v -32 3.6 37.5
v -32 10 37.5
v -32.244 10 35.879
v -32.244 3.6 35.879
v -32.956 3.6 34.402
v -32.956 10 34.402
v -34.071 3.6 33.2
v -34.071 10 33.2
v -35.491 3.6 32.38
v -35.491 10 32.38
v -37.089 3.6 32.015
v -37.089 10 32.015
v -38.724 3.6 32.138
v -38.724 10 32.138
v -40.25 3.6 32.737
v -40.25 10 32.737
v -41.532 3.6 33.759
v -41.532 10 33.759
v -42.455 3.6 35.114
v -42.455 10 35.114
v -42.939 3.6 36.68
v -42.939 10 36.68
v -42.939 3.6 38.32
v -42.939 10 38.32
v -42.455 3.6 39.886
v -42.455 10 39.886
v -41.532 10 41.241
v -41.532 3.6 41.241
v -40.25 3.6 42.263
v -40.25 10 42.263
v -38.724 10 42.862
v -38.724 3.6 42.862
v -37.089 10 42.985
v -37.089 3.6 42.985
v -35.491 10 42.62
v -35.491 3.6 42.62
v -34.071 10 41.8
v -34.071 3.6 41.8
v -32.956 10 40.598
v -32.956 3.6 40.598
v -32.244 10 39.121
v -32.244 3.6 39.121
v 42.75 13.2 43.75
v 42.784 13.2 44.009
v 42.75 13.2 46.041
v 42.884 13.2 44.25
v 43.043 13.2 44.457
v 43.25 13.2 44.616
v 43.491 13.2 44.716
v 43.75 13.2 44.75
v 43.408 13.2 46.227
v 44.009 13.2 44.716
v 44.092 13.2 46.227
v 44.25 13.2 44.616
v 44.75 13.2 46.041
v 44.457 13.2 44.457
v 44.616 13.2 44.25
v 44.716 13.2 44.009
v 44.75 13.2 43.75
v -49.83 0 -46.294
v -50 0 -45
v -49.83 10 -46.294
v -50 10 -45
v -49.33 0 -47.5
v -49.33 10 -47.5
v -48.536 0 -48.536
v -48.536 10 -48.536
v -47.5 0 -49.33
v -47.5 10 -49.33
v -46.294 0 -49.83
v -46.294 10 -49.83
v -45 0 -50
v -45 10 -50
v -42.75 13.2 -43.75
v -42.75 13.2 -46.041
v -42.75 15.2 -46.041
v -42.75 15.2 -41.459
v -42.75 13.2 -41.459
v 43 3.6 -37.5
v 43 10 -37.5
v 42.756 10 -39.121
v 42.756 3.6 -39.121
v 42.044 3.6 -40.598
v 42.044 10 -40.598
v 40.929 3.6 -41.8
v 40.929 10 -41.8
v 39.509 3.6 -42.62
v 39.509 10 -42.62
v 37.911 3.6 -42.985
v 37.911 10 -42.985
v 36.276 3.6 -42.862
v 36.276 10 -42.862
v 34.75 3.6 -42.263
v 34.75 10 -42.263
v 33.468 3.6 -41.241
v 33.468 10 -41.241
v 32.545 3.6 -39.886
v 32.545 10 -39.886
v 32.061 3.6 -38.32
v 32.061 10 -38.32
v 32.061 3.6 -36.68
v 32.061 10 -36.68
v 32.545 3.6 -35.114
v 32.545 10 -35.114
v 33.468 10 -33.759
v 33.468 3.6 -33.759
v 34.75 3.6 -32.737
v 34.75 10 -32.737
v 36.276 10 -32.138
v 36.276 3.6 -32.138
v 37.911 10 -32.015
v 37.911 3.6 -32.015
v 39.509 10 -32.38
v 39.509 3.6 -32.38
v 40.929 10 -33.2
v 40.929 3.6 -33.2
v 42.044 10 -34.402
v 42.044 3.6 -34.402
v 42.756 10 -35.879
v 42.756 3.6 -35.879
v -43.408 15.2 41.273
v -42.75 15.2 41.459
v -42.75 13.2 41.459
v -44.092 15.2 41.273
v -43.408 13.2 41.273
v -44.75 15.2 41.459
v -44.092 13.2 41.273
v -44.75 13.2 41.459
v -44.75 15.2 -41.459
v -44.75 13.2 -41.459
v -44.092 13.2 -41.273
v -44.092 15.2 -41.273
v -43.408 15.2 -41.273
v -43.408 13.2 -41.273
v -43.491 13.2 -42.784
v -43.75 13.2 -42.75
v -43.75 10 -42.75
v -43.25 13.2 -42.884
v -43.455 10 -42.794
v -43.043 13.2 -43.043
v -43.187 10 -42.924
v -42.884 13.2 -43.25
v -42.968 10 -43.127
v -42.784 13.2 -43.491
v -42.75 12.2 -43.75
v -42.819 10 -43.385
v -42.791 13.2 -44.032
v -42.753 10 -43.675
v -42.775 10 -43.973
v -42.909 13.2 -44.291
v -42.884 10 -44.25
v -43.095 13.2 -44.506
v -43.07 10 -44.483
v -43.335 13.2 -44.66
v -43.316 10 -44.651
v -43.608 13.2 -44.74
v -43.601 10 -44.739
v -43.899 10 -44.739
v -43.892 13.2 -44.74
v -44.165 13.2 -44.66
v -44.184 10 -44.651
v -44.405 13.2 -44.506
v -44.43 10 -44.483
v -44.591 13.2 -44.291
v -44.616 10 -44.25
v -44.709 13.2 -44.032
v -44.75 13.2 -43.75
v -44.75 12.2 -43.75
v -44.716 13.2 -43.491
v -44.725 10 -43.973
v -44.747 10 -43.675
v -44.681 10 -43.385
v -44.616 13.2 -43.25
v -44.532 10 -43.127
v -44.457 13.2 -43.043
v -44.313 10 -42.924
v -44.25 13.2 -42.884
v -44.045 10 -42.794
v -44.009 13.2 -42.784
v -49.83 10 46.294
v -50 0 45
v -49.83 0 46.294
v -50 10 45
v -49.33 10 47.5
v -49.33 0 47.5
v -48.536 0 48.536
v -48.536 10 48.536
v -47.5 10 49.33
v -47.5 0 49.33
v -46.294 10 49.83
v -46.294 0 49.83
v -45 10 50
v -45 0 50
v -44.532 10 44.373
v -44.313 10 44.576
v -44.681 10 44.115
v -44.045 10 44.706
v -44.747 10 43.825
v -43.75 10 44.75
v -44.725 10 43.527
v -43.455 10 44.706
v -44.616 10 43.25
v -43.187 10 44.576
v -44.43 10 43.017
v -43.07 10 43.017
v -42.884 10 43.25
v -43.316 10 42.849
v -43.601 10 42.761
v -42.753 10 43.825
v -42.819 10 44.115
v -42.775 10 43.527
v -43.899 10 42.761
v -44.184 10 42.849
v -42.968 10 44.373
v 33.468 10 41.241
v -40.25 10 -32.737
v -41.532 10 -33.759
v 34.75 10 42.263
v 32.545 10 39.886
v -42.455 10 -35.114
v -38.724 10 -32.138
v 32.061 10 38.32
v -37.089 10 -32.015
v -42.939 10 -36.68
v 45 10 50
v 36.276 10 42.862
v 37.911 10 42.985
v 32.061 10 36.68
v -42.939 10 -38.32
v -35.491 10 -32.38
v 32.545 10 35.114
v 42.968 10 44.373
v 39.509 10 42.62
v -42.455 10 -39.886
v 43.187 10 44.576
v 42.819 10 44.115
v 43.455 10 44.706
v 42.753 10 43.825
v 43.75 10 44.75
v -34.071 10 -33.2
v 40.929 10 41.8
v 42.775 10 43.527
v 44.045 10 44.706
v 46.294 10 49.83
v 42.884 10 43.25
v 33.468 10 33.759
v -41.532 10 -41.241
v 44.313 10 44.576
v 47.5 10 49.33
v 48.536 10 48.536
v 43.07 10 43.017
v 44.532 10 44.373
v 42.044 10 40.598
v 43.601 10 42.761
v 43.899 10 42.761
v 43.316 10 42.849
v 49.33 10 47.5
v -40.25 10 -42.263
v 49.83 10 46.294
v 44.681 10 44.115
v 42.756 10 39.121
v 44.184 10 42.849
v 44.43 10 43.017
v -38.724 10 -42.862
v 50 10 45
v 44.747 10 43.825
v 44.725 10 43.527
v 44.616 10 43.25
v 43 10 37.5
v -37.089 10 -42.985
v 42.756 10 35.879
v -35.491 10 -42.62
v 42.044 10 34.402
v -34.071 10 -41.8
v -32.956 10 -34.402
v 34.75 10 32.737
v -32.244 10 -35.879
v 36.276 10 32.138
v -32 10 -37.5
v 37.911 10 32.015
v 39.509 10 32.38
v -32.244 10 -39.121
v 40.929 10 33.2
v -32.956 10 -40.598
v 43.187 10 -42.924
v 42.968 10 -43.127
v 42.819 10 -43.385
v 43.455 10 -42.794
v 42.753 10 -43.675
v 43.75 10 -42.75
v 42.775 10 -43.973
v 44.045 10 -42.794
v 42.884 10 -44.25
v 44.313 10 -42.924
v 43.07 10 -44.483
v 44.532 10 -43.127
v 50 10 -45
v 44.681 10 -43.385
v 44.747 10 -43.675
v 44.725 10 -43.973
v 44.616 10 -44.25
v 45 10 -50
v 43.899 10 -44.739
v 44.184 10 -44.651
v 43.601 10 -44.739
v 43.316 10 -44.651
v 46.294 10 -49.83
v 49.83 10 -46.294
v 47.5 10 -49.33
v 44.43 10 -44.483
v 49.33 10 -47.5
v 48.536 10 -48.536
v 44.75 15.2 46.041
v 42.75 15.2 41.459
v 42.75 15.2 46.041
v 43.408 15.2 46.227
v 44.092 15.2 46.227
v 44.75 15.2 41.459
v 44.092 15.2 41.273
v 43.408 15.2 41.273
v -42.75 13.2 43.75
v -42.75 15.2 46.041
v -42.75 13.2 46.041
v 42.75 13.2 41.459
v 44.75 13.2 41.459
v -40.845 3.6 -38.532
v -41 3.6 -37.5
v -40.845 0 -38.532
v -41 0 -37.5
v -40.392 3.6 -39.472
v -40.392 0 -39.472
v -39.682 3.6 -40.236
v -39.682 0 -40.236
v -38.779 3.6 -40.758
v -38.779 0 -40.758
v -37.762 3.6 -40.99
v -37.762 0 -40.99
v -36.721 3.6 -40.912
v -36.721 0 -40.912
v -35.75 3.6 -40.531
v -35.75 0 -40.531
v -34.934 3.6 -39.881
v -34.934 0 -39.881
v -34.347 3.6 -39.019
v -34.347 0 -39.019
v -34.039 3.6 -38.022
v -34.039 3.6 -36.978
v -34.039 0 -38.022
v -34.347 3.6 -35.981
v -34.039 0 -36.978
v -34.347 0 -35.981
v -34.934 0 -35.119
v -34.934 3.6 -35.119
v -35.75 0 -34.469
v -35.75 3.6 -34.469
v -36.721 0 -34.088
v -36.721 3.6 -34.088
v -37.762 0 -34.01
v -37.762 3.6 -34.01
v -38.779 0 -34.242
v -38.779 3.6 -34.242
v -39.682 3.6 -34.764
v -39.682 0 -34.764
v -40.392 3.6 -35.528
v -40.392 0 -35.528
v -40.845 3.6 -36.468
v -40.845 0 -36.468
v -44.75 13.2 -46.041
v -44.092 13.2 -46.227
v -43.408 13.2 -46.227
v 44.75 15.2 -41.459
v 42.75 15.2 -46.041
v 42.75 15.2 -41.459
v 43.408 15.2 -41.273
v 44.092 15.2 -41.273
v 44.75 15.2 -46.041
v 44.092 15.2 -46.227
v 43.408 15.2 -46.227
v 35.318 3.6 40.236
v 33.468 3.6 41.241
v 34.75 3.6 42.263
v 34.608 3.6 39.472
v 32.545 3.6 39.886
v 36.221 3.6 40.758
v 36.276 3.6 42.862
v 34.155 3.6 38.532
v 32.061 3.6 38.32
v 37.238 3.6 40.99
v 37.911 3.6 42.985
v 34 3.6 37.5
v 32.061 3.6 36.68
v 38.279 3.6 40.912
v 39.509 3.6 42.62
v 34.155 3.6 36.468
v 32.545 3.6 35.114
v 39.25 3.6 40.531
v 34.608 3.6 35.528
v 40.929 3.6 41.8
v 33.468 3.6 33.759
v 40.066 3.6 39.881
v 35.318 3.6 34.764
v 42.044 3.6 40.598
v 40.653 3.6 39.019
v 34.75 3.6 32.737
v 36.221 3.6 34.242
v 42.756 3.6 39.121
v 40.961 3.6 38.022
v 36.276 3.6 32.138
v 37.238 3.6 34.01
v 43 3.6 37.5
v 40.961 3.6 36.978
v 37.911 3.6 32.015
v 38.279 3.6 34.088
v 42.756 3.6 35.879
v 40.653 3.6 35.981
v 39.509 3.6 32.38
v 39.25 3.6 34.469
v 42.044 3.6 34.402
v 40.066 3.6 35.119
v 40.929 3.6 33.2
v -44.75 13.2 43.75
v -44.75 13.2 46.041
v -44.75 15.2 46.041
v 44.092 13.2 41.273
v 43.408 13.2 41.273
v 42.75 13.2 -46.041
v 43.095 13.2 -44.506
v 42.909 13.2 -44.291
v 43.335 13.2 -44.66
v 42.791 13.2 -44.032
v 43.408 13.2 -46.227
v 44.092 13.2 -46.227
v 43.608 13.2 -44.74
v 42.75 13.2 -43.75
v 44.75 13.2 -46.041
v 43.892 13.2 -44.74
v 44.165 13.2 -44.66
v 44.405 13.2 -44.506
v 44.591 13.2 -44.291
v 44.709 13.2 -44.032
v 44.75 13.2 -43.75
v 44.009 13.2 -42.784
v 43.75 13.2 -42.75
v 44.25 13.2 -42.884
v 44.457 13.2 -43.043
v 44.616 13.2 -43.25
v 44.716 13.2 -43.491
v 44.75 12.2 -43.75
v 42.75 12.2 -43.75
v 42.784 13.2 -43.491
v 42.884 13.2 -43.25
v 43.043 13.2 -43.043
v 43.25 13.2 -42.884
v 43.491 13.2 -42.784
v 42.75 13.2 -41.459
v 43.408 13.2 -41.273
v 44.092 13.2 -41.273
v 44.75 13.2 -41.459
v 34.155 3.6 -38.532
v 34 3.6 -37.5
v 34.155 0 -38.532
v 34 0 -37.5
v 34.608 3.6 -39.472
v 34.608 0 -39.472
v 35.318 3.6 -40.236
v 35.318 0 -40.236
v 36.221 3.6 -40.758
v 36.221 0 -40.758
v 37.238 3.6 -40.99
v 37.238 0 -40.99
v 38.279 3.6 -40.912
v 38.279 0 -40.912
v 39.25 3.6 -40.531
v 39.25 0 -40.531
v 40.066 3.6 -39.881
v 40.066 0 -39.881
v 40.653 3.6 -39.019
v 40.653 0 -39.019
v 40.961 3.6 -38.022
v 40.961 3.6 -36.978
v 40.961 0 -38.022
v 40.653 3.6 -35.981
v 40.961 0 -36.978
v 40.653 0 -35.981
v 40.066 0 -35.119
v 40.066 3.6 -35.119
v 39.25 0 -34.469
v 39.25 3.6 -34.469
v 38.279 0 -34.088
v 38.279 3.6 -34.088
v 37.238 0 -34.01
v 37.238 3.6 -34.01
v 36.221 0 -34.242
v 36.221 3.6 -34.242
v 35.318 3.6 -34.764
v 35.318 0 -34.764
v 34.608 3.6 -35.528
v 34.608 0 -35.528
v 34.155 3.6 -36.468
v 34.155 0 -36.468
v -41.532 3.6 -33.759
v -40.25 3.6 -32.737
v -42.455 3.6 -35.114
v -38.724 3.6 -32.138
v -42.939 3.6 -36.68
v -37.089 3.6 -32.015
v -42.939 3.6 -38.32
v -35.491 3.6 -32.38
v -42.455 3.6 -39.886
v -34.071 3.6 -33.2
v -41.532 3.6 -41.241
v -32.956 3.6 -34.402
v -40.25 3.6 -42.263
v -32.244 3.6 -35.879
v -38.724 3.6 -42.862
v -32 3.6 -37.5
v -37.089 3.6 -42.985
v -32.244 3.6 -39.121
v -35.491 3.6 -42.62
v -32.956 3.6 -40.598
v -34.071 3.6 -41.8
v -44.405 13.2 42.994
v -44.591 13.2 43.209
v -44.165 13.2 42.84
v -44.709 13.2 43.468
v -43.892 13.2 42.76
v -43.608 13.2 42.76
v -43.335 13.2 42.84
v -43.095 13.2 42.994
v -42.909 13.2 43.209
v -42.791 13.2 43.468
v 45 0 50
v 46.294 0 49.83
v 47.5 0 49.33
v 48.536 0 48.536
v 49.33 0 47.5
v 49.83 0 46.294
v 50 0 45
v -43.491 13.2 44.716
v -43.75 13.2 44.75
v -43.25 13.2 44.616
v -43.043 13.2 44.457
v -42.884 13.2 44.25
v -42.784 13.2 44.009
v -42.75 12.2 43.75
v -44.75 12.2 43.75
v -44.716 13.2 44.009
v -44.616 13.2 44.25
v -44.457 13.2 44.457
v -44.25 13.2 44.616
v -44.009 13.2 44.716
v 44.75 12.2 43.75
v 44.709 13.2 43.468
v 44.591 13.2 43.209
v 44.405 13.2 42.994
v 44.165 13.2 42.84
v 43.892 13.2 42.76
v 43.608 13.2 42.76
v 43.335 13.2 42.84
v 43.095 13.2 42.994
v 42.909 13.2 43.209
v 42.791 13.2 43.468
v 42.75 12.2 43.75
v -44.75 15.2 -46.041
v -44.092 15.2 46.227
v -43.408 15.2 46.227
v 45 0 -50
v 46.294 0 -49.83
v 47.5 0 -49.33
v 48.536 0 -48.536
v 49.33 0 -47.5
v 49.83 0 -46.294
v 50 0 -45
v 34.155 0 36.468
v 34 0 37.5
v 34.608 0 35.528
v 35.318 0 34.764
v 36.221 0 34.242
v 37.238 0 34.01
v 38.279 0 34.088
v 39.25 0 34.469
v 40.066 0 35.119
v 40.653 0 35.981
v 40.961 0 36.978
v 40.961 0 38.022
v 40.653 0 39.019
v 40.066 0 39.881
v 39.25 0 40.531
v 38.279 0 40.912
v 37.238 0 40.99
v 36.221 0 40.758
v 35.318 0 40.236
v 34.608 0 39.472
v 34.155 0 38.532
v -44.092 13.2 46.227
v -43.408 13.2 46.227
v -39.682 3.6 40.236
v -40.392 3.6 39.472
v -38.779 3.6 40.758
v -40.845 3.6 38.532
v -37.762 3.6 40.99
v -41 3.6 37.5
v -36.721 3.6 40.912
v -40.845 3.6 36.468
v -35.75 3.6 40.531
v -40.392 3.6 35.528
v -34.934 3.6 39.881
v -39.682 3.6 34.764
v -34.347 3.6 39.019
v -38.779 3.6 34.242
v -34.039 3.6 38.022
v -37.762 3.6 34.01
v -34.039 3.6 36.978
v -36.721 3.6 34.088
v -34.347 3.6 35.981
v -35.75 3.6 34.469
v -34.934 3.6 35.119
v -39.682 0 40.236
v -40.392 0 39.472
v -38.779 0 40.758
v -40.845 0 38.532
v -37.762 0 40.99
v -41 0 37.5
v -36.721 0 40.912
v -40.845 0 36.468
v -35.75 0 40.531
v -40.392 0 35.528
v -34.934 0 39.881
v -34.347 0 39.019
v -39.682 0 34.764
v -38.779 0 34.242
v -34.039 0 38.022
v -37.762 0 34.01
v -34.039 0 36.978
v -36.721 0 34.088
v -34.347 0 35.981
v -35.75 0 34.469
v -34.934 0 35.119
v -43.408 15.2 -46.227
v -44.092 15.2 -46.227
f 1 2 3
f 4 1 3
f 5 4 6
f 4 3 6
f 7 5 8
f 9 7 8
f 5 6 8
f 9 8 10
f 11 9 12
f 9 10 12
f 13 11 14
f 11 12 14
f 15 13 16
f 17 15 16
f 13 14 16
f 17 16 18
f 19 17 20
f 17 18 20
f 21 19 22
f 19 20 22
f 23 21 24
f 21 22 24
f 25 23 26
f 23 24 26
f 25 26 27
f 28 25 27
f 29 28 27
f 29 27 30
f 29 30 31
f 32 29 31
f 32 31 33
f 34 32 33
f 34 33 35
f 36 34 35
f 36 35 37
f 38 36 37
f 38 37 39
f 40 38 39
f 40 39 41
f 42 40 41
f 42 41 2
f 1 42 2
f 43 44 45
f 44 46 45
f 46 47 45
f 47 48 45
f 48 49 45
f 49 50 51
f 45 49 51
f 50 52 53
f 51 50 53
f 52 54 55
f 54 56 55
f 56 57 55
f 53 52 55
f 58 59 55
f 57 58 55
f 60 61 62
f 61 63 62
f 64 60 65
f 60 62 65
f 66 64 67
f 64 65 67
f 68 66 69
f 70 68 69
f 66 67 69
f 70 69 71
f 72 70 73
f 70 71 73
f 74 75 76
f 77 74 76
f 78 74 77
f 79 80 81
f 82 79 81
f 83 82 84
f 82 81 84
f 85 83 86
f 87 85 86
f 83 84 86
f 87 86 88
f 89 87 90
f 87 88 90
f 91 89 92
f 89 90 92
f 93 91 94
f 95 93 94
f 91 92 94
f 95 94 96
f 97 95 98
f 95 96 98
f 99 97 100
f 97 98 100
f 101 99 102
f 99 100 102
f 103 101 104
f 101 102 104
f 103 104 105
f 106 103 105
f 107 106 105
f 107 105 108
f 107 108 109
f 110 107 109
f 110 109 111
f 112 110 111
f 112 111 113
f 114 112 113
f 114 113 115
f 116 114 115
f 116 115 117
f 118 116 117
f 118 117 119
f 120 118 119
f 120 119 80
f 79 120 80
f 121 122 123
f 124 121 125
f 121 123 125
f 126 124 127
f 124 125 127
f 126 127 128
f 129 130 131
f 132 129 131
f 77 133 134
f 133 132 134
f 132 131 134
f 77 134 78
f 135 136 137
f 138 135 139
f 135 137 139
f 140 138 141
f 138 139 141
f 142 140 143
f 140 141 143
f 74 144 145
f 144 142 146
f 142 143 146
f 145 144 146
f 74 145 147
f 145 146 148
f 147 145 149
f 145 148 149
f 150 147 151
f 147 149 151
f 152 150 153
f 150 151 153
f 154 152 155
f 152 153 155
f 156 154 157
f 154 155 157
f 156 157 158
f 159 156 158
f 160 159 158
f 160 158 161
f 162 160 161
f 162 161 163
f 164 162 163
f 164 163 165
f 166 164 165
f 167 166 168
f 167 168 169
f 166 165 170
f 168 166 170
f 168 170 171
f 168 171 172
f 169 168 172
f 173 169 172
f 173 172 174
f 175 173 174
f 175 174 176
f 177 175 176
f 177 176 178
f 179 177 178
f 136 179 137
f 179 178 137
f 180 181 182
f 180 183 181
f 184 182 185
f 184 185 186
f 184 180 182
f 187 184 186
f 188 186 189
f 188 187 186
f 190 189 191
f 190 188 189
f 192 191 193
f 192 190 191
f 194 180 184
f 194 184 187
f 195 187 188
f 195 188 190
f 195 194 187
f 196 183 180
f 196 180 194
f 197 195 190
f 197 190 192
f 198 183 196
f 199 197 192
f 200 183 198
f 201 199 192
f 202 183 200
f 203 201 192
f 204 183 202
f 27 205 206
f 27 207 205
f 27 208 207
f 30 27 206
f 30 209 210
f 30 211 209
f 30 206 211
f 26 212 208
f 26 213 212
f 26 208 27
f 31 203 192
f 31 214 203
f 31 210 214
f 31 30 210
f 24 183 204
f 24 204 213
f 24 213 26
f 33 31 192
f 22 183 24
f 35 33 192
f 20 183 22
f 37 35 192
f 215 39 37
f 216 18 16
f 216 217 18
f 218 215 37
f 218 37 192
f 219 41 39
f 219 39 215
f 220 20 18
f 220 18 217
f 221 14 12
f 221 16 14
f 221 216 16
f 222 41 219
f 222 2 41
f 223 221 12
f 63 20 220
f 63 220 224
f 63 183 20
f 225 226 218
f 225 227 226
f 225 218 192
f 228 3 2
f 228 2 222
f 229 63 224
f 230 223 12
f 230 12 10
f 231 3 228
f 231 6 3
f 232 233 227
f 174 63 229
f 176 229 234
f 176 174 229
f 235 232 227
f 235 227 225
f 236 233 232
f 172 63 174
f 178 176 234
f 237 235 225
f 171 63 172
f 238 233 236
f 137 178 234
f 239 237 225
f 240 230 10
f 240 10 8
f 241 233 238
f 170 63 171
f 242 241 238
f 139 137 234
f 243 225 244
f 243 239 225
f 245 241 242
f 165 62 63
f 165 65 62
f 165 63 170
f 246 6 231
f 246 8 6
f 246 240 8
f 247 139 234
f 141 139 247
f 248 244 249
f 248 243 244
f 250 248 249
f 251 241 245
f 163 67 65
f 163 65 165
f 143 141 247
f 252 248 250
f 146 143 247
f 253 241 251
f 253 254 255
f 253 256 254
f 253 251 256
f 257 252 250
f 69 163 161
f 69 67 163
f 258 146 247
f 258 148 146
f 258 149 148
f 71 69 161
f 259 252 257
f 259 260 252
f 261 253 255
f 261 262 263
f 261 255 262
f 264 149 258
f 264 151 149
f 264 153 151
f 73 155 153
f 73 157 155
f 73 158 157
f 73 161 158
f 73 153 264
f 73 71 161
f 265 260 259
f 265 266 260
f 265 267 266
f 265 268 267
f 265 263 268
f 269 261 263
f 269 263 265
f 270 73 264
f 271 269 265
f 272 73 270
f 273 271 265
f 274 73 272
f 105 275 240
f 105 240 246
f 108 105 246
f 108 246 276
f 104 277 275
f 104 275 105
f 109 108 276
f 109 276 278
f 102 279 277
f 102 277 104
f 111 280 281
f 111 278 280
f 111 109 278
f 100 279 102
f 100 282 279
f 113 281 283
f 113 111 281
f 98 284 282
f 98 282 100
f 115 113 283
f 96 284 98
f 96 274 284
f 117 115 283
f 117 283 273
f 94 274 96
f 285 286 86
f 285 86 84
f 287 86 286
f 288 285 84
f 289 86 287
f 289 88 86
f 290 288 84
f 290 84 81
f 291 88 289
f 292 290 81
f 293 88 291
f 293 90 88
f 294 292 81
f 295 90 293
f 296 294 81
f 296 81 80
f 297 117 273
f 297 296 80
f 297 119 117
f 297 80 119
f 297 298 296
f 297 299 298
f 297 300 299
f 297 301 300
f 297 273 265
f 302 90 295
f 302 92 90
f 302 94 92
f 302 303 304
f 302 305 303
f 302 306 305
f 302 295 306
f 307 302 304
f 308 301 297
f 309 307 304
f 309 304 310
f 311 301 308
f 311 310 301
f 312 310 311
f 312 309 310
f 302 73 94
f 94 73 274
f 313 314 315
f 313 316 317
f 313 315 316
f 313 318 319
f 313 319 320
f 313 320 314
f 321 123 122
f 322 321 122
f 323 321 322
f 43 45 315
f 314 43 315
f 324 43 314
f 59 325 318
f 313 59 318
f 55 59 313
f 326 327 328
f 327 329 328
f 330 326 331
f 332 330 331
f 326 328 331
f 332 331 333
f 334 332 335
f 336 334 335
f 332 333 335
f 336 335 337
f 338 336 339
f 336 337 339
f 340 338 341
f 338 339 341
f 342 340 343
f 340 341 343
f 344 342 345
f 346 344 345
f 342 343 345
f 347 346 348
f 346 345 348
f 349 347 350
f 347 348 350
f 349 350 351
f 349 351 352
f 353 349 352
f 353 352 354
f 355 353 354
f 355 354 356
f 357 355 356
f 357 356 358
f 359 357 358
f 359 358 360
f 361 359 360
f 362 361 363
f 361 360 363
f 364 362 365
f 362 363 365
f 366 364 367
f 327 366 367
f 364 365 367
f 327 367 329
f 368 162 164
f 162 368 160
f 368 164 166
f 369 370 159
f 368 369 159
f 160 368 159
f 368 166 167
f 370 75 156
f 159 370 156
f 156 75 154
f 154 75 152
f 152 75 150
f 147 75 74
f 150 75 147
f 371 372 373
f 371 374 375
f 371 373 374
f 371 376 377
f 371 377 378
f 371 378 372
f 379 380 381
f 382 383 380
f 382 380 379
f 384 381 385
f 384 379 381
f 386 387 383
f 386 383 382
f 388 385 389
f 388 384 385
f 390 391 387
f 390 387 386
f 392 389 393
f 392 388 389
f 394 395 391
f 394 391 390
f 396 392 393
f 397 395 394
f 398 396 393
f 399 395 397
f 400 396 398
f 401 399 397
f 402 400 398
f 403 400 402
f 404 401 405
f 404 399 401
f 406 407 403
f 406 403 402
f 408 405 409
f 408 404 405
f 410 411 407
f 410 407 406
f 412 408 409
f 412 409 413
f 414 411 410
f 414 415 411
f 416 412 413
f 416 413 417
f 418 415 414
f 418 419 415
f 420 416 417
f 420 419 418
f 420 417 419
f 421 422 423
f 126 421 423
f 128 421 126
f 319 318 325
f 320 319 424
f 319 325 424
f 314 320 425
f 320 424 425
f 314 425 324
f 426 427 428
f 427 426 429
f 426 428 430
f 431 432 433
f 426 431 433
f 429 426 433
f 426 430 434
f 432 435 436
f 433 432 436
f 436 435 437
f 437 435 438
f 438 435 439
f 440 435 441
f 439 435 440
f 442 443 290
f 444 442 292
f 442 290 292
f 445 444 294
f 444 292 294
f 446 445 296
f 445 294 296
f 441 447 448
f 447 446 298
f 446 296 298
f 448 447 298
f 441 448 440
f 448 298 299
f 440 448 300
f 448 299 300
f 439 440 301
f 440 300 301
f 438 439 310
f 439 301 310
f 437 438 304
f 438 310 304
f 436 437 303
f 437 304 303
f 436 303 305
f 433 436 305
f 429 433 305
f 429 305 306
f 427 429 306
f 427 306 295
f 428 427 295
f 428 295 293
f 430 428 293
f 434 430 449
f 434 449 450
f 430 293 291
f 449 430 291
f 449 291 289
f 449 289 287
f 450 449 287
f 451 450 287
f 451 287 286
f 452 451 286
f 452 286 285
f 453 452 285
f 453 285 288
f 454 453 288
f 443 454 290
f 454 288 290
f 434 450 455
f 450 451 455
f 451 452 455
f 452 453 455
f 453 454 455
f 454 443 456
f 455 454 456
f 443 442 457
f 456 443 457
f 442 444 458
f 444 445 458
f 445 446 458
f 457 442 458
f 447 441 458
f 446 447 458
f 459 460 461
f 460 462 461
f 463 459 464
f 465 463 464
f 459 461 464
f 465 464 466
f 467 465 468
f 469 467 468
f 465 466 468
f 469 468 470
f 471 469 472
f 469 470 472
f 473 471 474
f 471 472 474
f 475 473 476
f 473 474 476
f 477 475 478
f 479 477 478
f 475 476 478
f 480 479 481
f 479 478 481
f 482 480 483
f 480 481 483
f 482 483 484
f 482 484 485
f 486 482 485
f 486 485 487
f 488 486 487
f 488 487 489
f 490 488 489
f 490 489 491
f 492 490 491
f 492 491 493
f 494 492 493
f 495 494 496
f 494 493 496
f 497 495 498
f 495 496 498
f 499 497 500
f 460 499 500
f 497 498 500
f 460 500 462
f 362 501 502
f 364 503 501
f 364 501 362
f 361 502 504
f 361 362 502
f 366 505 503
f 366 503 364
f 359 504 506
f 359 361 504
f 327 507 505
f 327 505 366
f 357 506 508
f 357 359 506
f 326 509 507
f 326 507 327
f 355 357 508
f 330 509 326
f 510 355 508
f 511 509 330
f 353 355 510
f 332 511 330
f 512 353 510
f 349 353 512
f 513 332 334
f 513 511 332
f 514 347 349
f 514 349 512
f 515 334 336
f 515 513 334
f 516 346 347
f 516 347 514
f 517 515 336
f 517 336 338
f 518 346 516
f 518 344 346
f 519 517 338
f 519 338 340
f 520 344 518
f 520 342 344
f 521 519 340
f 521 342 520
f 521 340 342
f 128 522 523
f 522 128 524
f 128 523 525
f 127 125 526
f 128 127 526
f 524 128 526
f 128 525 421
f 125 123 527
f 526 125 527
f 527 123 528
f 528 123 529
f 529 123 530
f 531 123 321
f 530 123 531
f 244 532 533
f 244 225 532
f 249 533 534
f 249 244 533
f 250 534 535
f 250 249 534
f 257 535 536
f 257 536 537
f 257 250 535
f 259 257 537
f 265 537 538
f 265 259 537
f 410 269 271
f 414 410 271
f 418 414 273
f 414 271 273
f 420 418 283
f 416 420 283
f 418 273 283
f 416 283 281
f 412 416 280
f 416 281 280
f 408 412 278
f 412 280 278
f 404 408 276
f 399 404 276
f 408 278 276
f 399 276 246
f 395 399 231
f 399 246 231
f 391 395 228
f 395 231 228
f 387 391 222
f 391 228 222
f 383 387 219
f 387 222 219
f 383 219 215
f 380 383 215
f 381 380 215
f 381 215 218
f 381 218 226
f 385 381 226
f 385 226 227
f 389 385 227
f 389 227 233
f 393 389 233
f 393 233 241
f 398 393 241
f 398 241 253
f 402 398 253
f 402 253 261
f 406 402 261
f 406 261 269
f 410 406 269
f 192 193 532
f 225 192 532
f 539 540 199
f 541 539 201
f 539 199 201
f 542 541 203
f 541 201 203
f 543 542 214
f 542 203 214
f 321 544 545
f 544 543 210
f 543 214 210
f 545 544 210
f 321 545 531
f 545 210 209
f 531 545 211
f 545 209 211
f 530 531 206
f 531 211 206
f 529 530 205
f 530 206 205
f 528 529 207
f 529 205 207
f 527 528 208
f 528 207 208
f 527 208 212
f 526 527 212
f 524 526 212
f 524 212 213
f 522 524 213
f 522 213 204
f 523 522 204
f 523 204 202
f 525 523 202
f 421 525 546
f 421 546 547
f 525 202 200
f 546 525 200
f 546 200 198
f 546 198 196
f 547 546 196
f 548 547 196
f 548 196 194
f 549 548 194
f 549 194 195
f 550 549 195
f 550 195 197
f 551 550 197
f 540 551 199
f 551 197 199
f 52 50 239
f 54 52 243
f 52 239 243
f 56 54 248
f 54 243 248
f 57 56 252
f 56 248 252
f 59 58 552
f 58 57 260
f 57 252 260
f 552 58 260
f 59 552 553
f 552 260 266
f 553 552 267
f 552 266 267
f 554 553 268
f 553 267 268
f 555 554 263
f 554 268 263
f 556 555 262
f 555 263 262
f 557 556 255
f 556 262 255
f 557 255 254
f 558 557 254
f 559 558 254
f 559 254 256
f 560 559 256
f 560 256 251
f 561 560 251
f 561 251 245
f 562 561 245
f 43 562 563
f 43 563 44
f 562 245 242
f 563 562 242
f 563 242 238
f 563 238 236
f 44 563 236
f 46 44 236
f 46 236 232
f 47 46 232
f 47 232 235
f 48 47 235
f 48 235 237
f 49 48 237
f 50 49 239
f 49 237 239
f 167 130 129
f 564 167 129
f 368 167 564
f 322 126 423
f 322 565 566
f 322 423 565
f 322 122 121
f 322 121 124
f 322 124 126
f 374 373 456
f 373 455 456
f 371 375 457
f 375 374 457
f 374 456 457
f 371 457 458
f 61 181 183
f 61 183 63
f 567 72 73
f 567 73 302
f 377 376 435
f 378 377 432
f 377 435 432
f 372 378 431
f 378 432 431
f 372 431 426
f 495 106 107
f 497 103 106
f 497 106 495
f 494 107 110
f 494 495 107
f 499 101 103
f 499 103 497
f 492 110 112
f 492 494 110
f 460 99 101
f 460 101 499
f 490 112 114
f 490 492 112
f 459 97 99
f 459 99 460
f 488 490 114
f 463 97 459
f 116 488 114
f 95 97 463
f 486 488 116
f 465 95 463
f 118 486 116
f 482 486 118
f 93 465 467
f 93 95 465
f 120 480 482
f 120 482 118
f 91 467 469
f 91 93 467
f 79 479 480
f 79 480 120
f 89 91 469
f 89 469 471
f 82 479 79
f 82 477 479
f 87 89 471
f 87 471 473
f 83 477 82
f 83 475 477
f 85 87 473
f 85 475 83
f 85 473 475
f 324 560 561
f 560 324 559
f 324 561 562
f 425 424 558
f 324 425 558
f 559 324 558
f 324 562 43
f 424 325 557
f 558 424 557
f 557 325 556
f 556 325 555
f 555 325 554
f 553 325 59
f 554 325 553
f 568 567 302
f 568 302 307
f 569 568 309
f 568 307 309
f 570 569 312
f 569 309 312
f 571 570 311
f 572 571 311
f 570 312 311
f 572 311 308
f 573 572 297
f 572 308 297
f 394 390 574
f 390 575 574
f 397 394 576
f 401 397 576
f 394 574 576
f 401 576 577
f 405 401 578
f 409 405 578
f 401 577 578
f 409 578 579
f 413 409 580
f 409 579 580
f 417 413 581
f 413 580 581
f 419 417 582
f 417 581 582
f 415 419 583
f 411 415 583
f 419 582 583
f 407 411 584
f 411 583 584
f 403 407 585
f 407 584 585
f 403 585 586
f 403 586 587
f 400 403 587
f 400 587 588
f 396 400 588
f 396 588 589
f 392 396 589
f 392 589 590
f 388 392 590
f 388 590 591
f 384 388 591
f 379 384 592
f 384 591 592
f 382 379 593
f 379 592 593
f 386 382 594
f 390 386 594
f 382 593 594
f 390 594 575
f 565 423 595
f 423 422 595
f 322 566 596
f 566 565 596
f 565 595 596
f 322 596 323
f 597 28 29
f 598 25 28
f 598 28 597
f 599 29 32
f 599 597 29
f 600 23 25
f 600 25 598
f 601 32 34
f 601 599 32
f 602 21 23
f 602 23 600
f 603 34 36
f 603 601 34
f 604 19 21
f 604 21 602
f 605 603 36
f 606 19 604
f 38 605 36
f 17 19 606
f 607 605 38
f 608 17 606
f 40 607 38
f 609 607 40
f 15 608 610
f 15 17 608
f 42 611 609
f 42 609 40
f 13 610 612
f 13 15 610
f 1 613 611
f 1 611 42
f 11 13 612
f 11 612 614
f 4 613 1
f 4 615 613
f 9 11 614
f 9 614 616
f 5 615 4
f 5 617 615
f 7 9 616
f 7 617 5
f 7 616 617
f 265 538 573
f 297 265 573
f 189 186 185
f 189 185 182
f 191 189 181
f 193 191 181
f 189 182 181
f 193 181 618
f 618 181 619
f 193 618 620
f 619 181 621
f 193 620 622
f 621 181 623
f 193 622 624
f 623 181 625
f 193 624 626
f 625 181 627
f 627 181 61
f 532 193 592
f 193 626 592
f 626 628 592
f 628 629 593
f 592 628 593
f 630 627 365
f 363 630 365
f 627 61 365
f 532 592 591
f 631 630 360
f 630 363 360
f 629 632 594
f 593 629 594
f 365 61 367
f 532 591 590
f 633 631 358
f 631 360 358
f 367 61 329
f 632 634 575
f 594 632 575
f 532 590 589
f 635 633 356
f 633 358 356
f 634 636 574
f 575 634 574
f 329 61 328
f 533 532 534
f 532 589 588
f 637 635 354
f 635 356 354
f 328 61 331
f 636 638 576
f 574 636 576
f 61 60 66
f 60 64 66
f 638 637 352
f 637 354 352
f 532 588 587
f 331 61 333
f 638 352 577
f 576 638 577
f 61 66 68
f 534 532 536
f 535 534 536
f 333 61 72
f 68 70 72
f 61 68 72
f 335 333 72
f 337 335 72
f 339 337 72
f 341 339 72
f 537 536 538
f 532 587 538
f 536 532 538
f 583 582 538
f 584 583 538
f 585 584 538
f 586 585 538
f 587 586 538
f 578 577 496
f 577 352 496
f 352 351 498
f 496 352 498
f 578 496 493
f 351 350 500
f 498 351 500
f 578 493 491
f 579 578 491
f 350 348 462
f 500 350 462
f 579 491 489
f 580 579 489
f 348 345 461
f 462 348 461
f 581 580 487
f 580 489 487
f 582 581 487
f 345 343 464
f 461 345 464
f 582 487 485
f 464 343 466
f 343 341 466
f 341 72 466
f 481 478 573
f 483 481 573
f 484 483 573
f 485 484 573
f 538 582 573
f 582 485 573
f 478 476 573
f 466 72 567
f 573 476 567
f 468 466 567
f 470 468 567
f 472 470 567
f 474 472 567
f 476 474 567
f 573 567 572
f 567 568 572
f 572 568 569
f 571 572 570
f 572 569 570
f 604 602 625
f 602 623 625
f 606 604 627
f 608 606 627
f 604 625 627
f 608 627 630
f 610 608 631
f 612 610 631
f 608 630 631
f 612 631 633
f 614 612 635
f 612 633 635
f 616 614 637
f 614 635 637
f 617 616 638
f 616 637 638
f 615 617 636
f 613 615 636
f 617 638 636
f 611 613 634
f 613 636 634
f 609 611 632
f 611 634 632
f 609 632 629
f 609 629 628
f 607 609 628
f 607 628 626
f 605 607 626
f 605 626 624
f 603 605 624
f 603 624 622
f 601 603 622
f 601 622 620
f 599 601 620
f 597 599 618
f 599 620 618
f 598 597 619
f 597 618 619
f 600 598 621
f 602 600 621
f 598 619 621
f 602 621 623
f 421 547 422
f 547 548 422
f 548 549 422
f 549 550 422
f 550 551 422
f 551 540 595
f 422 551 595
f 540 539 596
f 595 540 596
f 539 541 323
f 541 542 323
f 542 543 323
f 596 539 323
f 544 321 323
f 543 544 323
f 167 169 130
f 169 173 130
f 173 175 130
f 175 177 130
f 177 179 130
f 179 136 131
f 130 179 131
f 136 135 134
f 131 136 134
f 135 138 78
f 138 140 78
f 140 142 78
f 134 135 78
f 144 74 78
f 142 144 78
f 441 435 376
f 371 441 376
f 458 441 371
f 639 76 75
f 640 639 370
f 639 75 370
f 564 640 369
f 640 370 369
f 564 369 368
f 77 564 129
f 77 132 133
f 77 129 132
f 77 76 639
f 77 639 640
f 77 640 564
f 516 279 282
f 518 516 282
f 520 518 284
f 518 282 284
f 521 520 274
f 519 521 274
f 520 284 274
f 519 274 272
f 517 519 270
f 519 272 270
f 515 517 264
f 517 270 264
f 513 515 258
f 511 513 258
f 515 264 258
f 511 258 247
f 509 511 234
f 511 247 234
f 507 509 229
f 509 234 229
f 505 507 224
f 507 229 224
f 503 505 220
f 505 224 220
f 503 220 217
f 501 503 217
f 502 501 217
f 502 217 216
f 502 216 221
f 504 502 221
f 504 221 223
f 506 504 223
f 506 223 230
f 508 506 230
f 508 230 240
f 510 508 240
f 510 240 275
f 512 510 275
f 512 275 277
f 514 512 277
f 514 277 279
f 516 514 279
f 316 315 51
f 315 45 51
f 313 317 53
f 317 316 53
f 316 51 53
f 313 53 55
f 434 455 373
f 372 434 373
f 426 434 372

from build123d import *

# Parameters (mm, degrees)
SKETCH1_W                                           = 100
SKETCH1_H                                           = 100
BOSS_EXTRUDE1_DEPTH                                 = 10
CBORE_FOR_M6_HEX_SOCKET_HEAD_CAP_SCREW1_D           = 7
CBORE_FOR_M6_HEX_SOCKET_HEAD_CAP_SCREW1_DEPTH       = 17.946987833
CBORE_FOR_M6_HEX_SOCKET_HEAD_CAP_SCREW1_CBORE_D     = 11
CBORE_FOR_M6_HEX_SOCKET_HEAD_CAP_SCREW1_CBORE_DEPTH = 6.4
CBORE_FOR_M6_HEX_SOCKET_HEAD_CAP_SCREW1_TIP         = 2.103012167
FILLET1_R                                           = 5
SKETCH4_R                                           = 1
BOSS_EXTRUDE2_DEPTH                                 = 3.2
SKETCH5_R                                           = 2.5
BOSS_EXTRUDE3_DEPTH                                 = 2
CUT_EXTRUDE1_START                                  = -3
CUT_EXTRUDE1_DEPTH                                  = 3
LPATTERN1_COUNT                                     = 2
LPATTERN1_PITCH                                     = 87.5
LPATTERN1_COUNT_DIR2                                = 2
LPATTERN1_PITCH_DIR2                                = 87.5


with BuildPart() as part:
    # Sketch1 → Boss-Extrude1 (new body)
    with BuildSketch(Plane(origin=(0, 0, 0), x_dir=(1, 0, 0), z_dir=(0, 1, 0))):
        Rectangle(SKETCH1_W, SKETCH1_H)
    extrude(amount=BOSS_EXTRUDE1_DEPTH)

    # CBORE for M6 Hex Socket Head Cap Screw1
    with Locations(Plane(origin=(0, 10, 0), x_dir=(1, 0, 0), z_dir=(0, 1, 0))):
        with Locations((-37.5, -37.5), (37.5, -37.5), (37.5, 37.5), (-37.5, 37.5)):
            CounterBoreHole(CBORE_FOR_M6_HEX_SOCKET_HEAD_CAP_SCREW1_D / 2, CBORE_FOR_M6_HEX_SOCKET_HEAD_CAP_SCREW1_CBORE_D / 2, CBORE_FOR_M6_HEX_SOCKET_HEAD_CAP_SCREW1_CBORE_DEPTH, depth=CBORE_FOR_M6_HEX_SOCKET_HEAD_CAP_SCREW1_DEPTH)
            with Locations((0, 0, -(CBORE_FOR_M6_HEX_SOCKET_HEAD_CAP_SCREW1_DEPTH + CBORE_FOR_M6_HEX_SOCKET_HEAD_CAP_SCREW1_TIP / 2))):  # 118° drill point
                Cone(0, CBORE_FOR_M6_HEX_SOCKET_HEAD_CAP_SCREW1_D / 2, CBORE_FOR_M6_HEX_SOCKET_HEAD_CAP_SCREW1_TIP, mode=Mode.SUBTRACT)

    # Fillet1
    fillet1_edges = [part.edges().sort_by_distance(p)[0] for p in [
        (50, 5, 50),
        (-50, 5, 50),
        (-50, 5, -50),
        (50, 5, -50),
    ]]
    fillet(fillet1_edges, radius=FILLET1_R)

    # Sketch4 → Boss-Extrude2 (add)
    with BuildSketch(Plane(origin=(0, 10, 0), x_dir=(1, 0, 0), z_dir=(0, 1, 0))):
        with Locations(Location((-43.75, 43.75, 0), (0, 0, 270))):
            Circle(SKETCH4_R)
        with Locations(Location((43.75, 43.75, 0), (0, 0, 270))):
            Circle(SKETCH4_R)
        with Locations(Location((-43.75, -43.75, 0), (0, 0, 270))):
            Circle(SKETCH4_R)
        with Locations(Location((43.75, -43.75, 0), (0, 0, 270))):
            Circle(SKETCH4_R)
    extrude(amount=BOSS_EXTRUDE2_DEPTH)

    # Sketch5 → Boss-Extrude3 (add)
    with BuildSketch(Plane(origin=(0, 13.2, 0), x_dir=(1, 0, 0), z_dir=(0, 1, 0))):
        with Locations(Location((-43.75, 43.75, 0), (0, 0, 270))):
            Circle(SKETCH5_R)
        with Locations(Location((43.75, 43.75, 0), (0, 0, 270))):
            Circle(SKETCH5_R)
        with Locations(Location((43.75, -43.75, 0), (0, 0, 270))):
            Circle(SKETCH5_R)
        with Locations(Location((-43.75, -43.75, 0), (0, 0, 270))):
            Circle(SKETCH5_R)
    extrude(amount=BOSS_EXTRUDE3_DEPTH)

    # Sketch6 → Cut-Extrude1 (cut)
    with BuildSketch(Plane(origin=(0, 15.2, 0), x_dir=(1, 0, 0), z_dir=(0, 1, 0)).offset(CUT_EXTRUDE1_START)):
        with BuildLine():
            ThreePointArc((-44.75, 46.041287847), (-46.25, 43.75), (-44.75, 41.458712153))
            Line((-44.75, 41.458712153), (-44.75, 46.041287847))
        make_face()
        with BuildLine():
            Line((-42.75, 46.041287847), (-42.75, 41.458712153))
            ThreePointArc((-42.75, 41.458712153), (-41.658349934, 42.380693606), (-41.25, 43.75))
            ThreePointArc((-41.25, 43.75), (-41.658349934, 45.119306394), (-42.75, 46.041287847))
        make_face()
    cut_extrude1 = extrude(amount=CUT_EXTRUDE1_DEPTH, mode=Mode.SUBTRACT)

    # LPattern1: Cut-Extrude1 2 × 2
    with Locations(*[(j * LPATTERN1_PITCH_DIR2, 0, i * LPATTERN1_PITCH) for i in range(LPATTERN1_COUNT) for j in range(LPATTERN1_COUNT_DIR2) if (i, j) != (0, 0)]):
        add(cut_extrude1, mode=Mode.SUBTRACT)


solid = part.part
